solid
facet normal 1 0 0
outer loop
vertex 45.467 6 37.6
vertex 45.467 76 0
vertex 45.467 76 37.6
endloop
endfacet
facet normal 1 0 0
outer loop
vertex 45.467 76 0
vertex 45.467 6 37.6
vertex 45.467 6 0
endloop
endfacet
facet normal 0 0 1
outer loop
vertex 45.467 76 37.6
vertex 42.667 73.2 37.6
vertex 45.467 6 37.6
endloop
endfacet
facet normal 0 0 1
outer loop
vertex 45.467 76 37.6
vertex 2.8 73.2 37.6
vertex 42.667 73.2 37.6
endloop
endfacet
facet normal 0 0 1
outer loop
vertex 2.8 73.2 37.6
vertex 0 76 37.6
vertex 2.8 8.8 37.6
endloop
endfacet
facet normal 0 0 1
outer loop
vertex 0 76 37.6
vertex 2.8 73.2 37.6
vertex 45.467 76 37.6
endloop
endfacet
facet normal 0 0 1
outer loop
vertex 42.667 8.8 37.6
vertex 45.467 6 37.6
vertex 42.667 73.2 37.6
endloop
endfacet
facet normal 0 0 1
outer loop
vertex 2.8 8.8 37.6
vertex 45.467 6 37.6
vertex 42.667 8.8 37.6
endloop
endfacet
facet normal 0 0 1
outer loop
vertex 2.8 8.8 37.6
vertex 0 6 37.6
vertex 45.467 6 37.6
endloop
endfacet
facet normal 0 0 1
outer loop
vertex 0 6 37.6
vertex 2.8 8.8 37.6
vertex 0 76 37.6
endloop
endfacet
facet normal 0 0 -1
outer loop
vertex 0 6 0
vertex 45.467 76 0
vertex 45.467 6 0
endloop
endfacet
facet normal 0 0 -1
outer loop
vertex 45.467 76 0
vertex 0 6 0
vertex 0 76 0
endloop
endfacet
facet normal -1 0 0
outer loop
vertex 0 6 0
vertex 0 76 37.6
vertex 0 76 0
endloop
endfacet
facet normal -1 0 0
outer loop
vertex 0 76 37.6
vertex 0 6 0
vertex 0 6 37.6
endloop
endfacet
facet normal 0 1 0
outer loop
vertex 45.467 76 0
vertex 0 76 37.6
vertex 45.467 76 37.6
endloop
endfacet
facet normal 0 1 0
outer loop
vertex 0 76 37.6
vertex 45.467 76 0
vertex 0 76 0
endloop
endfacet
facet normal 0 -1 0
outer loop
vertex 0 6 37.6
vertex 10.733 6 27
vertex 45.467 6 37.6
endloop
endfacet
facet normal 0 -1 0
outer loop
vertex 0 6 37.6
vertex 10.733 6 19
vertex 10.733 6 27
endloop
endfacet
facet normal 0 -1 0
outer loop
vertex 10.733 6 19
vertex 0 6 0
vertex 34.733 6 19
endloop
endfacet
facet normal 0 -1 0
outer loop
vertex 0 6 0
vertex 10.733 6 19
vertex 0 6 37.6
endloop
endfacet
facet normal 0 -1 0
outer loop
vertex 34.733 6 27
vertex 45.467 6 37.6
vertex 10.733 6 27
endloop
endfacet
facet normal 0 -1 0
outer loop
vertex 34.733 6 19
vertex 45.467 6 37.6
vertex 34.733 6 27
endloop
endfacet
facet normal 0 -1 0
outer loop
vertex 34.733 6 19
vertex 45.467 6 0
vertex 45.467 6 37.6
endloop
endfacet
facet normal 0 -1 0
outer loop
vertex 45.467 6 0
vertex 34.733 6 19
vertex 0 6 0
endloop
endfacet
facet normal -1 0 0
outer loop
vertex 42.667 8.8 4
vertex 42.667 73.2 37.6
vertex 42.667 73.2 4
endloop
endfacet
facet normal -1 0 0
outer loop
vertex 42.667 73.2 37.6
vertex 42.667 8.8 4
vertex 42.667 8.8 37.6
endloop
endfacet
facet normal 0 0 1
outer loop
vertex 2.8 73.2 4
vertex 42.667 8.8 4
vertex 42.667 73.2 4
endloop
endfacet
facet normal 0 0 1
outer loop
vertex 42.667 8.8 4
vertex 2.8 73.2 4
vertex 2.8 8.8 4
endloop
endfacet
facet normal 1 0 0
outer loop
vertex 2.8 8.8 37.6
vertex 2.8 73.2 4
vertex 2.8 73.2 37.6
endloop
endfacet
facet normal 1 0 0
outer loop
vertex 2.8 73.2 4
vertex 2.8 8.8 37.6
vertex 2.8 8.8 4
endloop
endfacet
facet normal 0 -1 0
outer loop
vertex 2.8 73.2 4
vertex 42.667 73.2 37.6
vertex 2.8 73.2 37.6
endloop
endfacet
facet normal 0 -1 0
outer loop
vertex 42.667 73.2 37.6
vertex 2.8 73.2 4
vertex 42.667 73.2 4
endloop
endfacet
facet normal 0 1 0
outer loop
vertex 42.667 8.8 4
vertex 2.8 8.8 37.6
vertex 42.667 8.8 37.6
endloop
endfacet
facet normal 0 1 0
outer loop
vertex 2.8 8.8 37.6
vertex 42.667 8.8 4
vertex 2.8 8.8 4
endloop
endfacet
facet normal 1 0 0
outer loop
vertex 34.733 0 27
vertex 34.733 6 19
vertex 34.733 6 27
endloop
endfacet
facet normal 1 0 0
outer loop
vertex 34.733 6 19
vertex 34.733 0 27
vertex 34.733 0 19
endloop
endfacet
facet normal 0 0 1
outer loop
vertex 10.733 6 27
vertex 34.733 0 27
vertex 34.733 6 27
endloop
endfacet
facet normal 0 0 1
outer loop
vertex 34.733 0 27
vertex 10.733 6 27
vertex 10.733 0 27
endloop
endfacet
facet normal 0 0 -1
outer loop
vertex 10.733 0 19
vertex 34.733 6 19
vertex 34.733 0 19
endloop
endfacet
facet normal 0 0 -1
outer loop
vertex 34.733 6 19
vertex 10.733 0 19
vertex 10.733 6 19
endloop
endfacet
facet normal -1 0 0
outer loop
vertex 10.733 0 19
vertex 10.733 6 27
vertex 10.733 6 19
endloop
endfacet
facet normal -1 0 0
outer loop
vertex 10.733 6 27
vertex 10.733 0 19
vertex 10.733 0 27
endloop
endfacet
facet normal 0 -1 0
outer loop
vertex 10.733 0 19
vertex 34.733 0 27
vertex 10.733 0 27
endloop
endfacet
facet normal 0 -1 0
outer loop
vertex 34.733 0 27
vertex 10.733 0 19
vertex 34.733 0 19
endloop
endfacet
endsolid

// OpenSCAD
// file: drawer-parts.scad
// V4-compatible drawer, stock-horn extension, hold-down strip and speaker ring.
part="none"; $fn=40;
arm_access_d=8.5; // Stock-horn HUB ACCESS only, never a printed spline.
module lb(h,d=3.4){cylinder(h=h,d=d);}
module ls(l,w,h){hull()for(x=[-(l-w)/2,(l-w)/2])translate([x,0,0])lb(h,w);}
module bin(width=45.4666667,active=false){difference(){union(){
 difference(){cube([width,70,37.6]);translate([2.8,2.8,4])cube([width-5.6,64.4,37.6]);}
 translate([width/2-12,-6,19])cube([24,6.2,8]);
 if(active)translate([2,70,6])cube([14,9,13]);
}
if(active){translate([4,74.3,9])cube([6.65,2.84,11]);translate([13.2,72.2,5.9])lb(13.2,2.6);}
}}
module arm(){difference(){
 hull(){lb(4,18);translate([30,0,0])lb(4,12);}
 translate([0,0,-0.1])lb(4.2,arm_access_d);
 for(x=[9.5,15])translate([x,0,-0.1])ls(5,2.2,4.2);
}}
module strip(){difference(){cube([12,24,5]);translate([4,12,-0.1])lb(5.2);}}
module speaker_ring(){difference(){
 union(){lb(4,64);for(x=[-22,22],y=[-18,18])translate([x,y,0])lb(4,10);}
 translate([0,0,-0.1])lb(4.2,44);
 translate([0,0,2])lb(2.2,50.8);
 for(x=[-22,22],y=[-18,18])translate([x,y,-0.1])lb(4.2);
}}
if(part=="drawer")translate([0,6,0])bin();
if(part=="arm")translate([9,9,0])arm();
if(part=="strip")strip();
if(part=="ring")translate([32,32,0])speaker_ring();
// main file
// Same drawer geometry as the recovered cabinet, in millimetres.
// One unchanged small STL is reused SIX times. No sensor-specific drawer variant.
use <drawer-parts.scad>
part = "small";
if (part == "small") translate([0,6,0]) bin(45.4666667, false);
if (part == "wide") translate([0,6,0]) bin(146.8, false);
